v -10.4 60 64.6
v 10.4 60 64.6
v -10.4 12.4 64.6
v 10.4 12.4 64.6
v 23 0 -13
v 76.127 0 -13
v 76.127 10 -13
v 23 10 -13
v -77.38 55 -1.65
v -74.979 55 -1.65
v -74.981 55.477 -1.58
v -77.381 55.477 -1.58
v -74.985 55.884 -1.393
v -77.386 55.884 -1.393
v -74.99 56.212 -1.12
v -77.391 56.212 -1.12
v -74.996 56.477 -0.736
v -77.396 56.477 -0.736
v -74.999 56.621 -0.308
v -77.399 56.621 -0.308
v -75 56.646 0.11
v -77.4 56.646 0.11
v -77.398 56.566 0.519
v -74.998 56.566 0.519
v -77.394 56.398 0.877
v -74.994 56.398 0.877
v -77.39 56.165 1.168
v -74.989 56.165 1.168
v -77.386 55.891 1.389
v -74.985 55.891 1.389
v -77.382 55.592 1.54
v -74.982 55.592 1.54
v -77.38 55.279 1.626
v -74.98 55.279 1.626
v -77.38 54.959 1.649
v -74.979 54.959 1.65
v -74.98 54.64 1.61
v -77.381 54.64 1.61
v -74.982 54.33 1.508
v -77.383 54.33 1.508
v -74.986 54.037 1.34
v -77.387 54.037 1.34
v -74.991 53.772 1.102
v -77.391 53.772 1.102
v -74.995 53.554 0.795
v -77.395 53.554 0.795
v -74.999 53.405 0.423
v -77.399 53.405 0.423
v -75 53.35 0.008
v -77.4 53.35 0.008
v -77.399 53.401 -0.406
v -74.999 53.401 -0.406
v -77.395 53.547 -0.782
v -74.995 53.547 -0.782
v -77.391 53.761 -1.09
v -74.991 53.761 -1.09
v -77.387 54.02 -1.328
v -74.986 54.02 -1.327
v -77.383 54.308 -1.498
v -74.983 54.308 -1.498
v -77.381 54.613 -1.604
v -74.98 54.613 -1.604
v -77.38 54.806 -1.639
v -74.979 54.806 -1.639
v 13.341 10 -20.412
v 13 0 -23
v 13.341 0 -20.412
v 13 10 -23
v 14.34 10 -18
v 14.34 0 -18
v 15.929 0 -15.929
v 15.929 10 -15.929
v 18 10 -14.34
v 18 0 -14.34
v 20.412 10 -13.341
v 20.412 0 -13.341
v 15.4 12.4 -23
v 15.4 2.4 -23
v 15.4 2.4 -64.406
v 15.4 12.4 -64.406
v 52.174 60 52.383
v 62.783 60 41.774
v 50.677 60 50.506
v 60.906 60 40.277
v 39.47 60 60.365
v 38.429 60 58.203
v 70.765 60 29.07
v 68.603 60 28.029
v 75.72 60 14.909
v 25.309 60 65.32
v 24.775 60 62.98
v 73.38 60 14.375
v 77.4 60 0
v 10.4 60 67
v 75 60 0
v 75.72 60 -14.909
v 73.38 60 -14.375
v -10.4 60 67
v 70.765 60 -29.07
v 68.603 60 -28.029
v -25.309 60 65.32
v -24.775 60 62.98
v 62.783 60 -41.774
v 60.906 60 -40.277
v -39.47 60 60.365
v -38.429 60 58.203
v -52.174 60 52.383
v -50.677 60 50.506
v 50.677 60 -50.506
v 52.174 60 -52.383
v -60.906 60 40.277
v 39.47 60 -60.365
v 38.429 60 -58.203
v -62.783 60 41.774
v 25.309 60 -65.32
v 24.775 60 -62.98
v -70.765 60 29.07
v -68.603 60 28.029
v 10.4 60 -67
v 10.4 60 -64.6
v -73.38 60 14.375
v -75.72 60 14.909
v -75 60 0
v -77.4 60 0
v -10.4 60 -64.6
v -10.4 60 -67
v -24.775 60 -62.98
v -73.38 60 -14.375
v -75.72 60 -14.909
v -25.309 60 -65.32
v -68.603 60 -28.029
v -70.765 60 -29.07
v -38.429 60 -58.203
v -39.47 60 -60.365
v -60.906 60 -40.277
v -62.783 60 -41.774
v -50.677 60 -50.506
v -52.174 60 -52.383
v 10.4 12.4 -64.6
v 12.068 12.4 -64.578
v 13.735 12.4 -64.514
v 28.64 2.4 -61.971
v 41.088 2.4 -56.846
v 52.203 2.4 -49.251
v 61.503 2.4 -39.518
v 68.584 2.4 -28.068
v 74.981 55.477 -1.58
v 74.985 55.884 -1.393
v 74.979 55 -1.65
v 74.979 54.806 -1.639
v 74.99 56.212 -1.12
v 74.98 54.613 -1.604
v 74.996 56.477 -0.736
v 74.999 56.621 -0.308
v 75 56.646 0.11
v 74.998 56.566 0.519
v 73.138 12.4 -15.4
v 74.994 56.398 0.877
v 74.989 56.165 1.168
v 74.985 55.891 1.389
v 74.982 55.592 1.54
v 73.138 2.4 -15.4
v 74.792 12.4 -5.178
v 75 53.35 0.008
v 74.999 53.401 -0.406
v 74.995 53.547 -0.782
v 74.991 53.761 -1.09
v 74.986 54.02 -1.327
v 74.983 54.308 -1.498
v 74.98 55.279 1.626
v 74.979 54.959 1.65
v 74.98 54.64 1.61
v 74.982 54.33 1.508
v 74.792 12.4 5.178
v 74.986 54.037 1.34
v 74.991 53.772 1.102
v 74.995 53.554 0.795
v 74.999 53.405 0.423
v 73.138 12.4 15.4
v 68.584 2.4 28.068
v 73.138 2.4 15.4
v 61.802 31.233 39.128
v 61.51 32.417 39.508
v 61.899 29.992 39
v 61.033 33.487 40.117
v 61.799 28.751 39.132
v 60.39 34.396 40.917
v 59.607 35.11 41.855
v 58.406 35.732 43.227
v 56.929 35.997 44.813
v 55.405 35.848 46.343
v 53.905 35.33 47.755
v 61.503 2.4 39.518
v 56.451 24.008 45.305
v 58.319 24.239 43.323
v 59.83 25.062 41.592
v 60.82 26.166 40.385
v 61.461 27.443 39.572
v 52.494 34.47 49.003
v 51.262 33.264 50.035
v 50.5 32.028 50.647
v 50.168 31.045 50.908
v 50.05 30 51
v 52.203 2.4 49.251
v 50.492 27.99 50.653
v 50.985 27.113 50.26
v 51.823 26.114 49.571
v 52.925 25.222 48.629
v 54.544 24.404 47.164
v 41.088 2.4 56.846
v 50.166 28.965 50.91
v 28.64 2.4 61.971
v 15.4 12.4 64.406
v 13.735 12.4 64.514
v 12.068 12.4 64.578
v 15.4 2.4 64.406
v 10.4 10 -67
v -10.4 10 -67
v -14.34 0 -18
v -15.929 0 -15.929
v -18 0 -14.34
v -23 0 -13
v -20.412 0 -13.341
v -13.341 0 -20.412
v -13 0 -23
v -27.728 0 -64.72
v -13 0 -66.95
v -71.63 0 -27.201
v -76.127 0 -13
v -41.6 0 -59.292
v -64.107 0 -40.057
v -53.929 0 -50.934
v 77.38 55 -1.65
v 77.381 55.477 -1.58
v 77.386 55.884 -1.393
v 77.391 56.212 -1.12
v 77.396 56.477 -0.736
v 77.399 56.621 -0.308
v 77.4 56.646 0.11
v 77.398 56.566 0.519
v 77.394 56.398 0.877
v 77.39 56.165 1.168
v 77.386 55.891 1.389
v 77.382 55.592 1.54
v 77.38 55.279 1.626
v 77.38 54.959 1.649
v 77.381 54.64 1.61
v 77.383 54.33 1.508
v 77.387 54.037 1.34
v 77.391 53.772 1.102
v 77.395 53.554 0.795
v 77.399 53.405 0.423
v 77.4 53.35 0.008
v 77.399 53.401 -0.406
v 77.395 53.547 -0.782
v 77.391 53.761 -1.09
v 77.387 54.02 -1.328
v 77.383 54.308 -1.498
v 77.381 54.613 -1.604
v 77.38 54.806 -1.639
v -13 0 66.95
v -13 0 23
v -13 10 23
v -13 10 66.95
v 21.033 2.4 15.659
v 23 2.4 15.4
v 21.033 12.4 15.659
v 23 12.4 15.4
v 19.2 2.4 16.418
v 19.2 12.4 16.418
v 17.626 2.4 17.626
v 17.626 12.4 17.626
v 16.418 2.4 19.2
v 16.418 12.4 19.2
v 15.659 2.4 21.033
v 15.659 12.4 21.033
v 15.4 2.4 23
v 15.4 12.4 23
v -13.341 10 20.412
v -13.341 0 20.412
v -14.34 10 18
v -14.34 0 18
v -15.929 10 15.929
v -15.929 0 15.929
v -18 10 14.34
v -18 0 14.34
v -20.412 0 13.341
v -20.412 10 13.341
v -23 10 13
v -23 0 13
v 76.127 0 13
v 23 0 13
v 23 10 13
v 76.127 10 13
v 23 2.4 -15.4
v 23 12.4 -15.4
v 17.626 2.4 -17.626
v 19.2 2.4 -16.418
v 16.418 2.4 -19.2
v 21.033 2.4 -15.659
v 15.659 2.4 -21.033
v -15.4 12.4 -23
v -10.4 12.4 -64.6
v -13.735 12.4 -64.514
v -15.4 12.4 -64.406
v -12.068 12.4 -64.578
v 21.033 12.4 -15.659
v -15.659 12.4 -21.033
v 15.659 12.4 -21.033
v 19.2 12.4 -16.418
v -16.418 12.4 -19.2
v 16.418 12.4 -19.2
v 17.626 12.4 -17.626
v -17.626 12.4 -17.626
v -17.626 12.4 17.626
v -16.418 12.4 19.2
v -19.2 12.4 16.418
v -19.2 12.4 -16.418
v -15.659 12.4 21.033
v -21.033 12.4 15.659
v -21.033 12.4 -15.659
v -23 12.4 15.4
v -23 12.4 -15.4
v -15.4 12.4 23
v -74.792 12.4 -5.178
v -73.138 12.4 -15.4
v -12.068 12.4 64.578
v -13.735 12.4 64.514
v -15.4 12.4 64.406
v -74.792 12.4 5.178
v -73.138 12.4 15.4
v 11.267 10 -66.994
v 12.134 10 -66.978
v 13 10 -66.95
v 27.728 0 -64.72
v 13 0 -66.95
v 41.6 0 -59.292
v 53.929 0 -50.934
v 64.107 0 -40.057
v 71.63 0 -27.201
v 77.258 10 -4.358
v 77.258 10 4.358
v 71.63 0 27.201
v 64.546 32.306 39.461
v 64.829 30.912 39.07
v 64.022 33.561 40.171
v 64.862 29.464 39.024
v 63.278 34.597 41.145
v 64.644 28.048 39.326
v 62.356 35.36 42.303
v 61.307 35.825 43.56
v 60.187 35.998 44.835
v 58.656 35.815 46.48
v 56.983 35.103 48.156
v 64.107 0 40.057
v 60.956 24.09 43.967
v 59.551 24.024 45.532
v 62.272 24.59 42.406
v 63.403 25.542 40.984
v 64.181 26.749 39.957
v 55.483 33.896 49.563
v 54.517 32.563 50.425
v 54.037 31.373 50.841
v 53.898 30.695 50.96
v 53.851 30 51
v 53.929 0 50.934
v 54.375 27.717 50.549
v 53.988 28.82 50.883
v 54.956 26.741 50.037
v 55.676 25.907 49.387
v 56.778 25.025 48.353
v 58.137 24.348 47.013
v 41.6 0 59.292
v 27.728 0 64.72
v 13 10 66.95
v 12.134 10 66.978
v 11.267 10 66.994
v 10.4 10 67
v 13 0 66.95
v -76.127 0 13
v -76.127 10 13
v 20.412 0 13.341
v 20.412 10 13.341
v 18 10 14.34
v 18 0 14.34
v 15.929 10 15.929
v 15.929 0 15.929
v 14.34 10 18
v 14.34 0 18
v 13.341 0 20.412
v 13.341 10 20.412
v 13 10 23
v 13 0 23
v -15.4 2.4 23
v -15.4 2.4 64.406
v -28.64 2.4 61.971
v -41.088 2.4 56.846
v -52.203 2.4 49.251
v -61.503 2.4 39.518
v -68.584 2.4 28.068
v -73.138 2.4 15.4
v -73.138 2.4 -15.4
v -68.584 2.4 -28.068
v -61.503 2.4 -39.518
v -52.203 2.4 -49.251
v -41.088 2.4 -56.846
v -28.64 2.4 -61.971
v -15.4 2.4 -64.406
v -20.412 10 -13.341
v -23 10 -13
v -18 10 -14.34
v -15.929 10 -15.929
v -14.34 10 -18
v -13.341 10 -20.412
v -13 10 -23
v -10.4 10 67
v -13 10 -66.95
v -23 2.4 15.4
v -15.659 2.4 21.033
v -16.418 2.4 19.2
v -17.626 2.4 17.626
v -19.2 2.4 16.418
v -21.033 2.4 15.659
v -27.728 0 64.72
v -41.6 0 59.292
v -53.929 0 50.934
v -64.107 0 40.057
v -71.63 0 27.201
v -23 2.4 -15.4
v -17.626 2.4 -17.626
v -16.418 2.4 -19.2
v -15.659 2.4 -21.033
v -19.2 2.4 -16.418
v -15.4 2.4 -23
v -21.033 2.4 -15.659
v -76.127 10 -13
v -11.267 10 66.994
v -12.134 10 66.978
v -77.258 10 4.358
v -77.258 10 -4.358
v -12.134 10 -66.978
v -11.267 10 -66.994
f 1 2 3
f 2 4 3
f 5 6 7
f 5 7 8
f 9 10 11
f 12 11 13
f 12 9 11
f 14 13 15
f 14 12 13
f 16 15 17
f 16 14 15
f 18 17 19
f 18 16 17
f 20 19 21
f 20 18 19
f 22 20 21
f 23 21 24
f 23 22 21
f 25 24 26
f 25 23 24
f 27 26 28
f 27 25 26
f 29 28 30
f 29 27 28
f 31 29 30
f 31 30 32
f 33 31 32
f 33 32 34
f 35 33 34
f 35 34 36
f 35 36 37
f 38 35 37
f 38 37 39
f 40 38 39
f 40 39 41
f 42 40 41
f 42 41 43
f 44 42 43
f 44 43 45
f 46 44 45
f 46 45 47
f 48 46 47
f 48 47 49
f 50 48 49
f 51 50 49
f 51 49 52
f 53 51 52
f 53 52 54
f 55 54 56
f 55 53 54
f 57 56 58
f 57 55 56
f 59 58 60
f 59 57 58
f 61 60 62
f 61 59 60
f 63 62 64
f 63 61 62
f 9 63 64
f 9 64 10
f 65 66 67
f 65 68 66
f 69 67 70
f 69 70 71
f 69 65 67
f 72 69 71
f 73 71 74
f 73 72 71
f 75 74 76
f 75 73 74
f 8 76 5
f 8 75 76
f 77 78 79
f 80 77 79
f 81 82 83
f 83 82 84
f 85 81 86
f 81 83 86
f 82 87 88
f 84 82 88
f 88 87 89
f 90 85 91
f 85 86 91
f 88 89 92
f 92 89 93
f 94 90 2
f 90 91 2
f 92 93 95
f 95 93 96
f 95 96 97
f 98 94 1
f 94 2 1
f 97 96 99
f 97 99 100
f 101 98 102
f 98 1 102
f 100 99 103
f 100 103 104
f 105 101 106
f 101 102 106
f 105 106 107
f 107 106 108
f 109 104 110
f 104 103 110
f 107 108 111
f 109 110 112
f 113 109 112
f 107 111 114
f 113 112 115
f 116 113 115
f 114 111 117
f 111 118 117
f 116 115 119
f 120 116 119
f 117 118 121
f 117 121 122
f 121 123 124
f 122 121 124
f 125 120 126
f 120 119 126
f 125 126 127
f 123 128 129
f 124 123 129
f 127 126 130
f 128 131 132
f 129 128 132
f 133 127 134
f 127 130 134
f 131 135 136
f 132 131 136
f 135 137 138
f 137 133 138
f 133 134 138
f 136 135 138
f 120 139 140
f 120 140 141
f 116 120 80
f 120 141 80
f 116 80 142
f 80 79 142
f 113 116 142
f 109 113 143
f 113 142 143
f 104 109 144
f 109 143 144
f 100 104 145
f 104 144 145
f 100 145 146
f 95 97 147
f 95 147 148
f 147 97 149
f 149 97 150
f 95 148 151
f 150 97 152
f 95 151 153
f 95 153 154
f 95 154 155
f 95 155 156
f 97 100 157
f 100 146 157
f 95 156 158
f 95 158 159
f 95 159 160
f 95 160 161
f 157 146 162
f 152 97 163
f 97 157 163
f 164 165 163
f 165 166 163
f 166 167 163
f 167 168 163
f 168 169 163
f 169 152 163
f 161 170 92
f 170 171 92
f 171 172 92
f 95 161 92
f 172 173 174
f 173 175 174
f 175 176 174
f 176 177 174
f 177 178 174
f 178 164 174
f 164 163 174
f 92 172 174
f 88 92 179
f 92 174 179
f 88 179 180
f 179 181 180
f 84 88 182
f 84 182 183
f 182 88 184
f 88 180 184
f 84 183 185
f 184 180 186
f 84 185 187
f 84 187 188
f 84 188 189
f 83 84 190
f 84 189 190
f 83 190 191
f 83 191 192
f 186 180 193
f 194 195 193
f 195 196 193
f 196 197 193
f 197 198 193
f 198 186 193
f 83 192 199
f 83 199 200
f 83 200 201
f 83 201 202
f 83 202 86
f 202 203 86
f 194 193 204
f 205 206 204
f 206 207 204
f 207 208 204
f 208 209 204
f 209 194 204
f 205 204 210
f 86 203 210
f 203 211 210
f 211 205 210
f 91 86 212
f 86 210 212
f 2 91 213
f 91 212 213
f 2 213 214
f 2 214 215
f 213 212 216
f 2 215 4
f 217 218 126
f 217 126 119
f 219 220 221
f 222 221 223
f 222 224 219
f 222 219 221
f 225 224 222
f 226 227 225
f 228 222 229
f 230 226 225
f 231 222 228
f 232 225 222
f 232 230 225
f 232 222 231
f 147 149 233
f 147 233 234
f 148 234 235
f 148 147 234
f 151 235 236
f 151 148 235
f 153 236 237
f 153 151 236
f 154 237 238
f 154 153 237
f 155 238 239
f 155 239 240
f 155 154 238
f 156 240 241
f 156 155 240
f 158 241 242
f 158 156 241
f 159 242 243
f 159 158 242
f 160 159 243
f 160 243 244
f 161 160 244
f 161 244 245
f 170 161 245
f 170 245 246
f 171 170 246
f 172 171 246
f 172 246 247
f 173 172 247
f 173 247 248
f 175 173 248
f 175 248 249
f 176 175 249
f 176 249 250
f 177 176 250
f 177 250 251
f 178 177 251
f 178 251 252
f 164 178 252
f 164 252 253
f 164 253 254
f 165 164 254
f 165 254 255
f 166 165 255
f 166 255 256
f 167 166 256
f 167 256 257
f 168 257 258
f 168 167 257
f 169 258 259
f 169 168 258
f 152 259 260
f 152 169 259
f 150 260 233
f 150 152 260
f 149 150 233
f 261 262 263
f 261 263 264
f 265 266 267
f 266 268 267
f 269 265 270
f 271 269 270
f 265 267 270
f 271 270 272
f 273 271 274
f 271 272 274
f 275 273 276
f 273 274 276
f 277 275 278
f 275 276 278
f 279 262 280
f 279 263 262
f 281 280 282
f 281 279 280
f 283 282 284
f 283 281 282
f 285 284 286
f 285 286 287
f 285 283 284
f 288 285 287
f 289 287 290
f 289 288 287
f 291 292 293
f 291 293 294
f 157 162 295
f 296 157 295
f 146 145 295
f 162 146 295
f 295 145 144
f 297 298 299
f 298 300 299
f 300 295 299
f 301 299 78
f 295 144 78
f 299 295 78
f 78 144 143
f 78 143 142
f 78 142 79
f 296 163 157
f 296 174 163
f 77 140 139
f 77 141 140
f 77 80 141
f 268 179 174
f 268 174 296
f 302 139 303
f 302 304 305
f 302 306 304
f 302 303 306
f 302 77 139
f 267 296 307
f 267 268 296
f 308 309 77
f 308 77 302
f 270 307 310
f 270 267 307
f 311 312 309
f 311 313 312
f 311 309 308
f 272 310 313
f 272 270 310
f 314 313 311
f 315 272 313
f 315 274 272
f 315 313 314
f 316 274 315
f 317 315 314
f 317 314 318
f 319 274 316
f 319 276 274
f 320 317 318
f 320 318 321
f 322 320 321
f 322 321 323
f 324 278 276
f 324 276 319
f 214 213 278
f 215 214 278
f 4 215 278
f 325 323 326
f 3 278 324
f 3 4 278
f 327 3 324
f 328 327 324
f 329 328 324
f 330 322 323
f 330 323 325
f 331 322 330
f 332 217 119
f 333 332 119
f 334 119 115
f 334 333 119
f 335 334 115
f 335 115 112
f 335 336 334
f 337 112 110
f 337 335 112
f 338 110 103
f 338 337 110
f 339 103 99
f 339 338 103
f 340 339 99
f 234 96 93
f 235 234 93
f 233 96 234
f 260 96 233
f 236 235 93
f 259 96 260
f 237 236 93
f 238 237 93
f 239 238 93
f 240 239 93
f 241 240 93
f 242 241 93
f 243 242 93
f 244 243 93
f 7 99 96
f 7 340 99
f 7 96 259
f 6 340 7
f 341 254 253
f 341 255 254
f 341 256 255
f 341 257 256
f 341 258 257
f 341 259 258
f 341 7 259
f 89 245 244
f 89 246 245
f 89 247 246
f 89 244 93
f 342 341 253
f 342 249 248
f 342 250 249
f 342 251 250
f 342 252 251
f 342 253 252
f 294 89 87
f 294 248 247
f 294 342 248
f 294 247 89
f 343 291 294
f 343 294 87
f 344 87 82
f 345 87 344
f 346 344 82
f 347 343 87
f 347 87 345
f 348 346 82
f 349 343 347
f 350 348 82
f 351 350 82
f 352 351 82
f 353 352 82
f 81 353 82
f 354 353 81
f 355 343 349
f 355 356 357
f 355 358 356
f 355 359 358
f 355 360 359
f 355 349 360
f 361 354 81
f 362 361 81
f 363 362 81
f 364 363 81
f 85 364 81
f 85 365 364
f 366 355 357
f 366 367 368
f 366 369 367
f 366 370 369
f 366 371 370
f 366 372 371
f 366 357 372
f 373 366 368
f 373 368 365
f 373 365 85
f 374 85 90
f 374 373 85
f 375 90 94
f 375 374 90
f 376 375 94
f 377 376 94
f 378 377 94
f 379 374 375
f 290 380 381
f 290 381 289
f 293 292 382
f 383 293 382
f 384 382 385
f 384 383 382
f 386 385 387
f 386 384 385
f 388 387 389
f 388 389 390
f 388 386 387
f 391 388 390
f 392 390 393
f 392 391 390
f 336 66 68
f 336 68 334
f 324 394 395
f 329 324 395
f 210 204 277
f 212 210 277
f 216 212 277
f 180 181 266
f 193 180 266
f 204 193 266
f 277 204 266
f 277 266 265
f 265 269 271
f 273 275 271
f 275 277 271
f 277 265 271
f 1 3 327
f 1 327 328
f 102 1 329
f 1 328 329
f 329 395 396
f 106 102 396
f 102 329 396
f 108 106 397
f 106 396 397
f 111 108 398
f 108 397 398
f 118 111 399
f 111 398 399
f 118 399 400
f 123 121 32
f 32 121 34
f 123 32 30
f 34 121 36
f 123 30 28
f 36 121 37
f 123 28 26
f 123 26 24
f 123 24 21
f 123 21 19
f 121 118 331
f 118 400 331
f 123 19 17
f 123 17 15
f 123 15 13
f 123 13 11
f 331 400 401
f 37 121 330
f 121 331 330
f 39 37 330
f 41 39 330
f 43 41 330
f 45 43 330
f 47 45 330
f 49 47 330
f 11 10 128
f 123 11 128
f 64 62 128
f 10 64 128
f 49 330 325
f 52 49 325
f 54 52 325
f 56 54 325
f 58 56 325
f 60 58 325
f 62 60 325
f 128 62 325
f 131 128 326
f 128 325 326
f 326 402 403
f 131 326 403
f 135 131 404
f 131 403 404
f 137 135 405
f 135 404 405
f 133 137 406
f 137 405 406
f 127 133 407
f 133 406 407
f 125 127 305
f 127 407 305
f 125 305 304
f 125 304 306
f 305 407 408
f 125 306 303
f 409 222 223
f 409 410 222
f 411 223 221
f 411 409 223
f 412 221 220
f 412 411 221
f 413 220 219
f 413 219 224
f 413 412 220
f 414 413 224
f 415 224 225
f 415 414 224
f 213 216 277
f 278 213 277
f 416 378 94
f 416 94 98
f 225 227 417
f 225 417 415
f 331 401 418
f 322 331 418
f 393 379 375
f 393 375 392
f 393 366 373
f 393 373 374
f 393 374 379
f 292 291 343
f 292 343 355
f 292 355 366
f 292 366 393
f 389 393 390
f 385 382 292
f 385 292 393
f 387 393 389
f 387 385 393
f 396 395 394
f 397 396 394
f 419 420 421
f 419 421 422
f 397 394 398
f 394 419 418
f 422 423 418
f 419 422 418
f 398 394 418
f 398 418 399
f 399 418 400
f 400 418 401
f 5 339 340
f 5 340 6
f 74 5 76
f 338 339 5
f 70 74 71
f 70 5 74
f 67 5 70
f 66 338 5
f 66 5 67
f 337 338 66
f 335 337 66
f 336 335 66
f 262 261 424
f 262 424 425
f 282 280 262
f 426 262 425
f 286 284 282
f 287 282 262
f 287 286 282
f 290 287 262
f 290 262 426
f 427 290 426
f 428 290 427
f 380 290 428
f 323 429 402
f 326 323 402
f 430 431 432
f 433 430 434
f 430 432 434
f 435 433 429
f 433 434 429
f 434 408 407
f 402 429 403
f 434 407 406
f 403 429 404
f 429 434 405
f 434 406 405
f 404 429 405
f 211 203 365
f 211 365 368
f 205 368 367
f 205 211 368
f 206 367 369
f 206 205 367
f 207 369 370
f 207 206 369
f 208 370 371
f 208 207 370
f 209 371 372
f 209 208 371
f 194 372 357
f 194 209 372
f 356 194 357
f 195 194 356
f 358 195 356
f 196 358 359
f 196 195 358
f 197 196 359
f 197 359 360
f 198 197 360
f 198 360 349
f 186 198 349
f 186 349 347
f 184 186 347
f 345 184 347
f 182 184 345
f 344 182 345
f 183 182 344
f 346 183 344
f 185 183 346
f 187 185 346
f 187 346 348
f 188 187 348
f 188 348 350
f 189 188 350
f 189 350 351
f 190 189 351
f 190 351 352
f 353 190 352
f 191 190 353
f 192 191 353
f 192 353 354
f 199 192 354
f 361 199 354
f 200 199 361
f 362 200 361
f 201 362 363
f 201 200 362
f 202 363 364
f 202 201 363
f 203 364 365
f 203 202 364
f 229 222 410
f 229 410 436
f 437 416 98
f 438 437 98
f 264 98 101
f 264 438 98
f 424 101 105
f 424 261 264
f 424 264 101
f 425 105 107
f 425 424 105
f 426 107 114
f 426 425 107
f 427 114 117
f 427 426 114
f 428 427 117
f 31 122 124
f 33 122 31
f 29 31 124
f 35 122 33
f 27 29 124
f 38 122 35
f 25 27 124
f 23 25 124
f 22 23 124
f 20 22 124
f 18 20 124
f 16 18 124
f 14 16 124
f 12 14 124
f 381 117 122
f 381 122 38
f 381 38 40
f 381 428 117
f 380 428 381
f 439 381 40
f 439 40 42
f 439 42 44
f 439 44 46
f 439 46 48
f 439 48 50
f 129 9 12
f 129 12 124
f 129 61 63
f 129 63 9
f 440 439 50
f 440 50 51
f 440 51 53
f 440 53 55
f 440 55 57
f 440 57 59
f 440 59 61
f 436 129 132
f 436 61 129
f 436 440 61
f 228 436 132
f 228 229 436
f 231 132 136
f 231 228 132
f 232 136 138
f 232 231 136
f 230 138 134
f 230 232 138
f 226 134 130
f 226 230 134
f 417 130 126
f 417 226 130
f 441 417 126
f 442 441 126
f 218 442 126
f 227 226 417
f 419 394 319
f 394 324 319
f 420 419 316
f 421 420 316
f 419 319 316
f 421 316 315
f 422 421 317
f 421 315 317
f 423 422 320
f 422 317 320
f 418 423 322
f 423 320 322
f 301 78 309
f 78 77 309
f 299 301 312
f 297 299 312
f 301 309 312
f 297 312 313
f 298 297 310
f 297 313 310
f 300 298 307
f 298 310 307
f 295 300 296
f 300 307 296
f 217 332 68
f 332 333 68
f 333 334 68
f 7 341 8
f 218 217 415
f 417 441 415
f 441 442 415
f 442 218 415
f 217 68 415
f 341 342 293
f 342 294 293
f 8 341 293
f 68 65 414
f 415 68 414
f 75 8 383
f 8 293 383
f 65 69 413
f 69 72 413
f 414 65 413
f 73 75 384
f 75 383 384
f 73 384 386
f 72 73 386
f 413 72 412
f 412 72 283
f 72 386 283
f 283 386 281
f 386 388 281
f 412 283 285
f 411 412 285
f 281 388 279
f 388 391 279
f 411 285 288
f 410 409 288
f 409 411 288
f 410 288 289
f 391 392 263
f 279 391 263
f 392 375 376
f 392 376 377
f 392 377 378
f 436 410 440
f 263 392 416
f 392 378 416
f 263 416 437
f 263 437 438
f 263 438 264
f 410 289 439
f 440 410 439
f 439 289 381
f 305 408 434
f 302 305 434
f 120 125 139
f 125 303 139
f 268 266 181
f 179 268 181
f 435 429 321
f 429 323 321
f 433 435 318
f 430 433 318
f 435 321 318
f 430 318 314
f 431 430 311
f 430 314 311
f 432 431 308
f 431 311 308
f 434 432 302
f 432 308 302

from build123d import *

# Parameters (mm, degrees)
BOSS_EXTRUDE1_DEPTH     = 60
CUT_EXTRUDE1_DEPTH      = 10
FILLET1_R               = 10
SHELL1_T                = -2.4
CUT_EXTRUDE2_DEPTH      = 119.658164489
CUT_EXTRUDE2_DEPTH_BACK = 119.658164489
SKETCH3_R               = 1.65
SKETCH4_R               = 6
CUT_EXTRUDE3_DEPTH      = 119.658164667


with BuildPart() as part:
    # Sketch1 → Boss-Extrude1 (new body)
    with BuildSketch(Plane(origin=(0, 0, 0), x_dir=(1, 0, 0), z_dir=(0, 1, 0))):
        with BuildLine():
            Line((-10.4, 67), (10.4, 67))
            ThreePointArc((10.4, 67), (77.4, 0), (10.4, -67))
            Line((10.4, -67), (-10.4, -67))
            ThreePointArc((-10.4, -67), (-77.4, 0), (-10.4, 67))
        make_face()
    extrude(amount=BOSS_EXTRUDE1_DEPTH)

    # Sketch2 → Cut-Extrude1 (cut)
    with BuildSketch(Plane.XZ):
        Polygon((-91.251700072, 13), (-13, 13), (-13, 91.251700072), (13, 91.251700072), (13, 13), (91.251700072, 13), (91.251700072, -13), (13, -13), (13, -91.251700072), (-13, -91.251700072), (-13, -13), (-91.251700072, -13), align=None)
    extrude(amount=-CUT_EXTRUDE1_DEPTH, mode=Mode.SUBTRACT)

    # Fillet1
    fillet1_edges = [part.edges().sort_by_distance(p)[0] for p in [
        (-13, 5, 13),
        (13, 5, 13),
        (13, 5, -13),
        (-13, 5, -13),
    ]]
    fillet(fillet1_edges, radius=FILLET1_R)

    # Shell1
    shell1_openings = [part.faces().sort_by_distance(p)[0] for p in [
        (0, 60, 0),
    ]]
    offset(amount=SHELL1_T, openings=shell1_openings, kind=Kind.INTERSECTION)

    # Sketch3 → Cut-Extrude2 (cut, two sides: drawn at the far end of the back side and taken through both)
    with BuildSketch(Plane(origin=(0, 0, 0), x_dir=(0, 0, -1), z_dir=(1, 0, 0)).offset(-CUT_EXTRUDE2_DEPTH_BACK)):
        with Locations((0, 55)):
            Circle(SKETCH3_R)
    extrude(amount=CUT_EXTRUDE2_DEPTH + CUT_EXTRUDE2_DEPTH_BACK, mode=Mode.SUBTRACT)

    # Sketch4 → Cut-Extrude3 (cut, through all)
    with BuildSketch(Plane(origin=(0, 0, 0), x_dir=(0, 0, -1), z_dir=(1, 0, 0))):
        with Locations(Location((-45, 30, 0), (0, 0, 180))):
            Circle(SKETCH4_R)
    extrude(amount=CUT_EXTRUDE3_DEPTH, mode=Mode.SUBTRACT)


solid = part.part
